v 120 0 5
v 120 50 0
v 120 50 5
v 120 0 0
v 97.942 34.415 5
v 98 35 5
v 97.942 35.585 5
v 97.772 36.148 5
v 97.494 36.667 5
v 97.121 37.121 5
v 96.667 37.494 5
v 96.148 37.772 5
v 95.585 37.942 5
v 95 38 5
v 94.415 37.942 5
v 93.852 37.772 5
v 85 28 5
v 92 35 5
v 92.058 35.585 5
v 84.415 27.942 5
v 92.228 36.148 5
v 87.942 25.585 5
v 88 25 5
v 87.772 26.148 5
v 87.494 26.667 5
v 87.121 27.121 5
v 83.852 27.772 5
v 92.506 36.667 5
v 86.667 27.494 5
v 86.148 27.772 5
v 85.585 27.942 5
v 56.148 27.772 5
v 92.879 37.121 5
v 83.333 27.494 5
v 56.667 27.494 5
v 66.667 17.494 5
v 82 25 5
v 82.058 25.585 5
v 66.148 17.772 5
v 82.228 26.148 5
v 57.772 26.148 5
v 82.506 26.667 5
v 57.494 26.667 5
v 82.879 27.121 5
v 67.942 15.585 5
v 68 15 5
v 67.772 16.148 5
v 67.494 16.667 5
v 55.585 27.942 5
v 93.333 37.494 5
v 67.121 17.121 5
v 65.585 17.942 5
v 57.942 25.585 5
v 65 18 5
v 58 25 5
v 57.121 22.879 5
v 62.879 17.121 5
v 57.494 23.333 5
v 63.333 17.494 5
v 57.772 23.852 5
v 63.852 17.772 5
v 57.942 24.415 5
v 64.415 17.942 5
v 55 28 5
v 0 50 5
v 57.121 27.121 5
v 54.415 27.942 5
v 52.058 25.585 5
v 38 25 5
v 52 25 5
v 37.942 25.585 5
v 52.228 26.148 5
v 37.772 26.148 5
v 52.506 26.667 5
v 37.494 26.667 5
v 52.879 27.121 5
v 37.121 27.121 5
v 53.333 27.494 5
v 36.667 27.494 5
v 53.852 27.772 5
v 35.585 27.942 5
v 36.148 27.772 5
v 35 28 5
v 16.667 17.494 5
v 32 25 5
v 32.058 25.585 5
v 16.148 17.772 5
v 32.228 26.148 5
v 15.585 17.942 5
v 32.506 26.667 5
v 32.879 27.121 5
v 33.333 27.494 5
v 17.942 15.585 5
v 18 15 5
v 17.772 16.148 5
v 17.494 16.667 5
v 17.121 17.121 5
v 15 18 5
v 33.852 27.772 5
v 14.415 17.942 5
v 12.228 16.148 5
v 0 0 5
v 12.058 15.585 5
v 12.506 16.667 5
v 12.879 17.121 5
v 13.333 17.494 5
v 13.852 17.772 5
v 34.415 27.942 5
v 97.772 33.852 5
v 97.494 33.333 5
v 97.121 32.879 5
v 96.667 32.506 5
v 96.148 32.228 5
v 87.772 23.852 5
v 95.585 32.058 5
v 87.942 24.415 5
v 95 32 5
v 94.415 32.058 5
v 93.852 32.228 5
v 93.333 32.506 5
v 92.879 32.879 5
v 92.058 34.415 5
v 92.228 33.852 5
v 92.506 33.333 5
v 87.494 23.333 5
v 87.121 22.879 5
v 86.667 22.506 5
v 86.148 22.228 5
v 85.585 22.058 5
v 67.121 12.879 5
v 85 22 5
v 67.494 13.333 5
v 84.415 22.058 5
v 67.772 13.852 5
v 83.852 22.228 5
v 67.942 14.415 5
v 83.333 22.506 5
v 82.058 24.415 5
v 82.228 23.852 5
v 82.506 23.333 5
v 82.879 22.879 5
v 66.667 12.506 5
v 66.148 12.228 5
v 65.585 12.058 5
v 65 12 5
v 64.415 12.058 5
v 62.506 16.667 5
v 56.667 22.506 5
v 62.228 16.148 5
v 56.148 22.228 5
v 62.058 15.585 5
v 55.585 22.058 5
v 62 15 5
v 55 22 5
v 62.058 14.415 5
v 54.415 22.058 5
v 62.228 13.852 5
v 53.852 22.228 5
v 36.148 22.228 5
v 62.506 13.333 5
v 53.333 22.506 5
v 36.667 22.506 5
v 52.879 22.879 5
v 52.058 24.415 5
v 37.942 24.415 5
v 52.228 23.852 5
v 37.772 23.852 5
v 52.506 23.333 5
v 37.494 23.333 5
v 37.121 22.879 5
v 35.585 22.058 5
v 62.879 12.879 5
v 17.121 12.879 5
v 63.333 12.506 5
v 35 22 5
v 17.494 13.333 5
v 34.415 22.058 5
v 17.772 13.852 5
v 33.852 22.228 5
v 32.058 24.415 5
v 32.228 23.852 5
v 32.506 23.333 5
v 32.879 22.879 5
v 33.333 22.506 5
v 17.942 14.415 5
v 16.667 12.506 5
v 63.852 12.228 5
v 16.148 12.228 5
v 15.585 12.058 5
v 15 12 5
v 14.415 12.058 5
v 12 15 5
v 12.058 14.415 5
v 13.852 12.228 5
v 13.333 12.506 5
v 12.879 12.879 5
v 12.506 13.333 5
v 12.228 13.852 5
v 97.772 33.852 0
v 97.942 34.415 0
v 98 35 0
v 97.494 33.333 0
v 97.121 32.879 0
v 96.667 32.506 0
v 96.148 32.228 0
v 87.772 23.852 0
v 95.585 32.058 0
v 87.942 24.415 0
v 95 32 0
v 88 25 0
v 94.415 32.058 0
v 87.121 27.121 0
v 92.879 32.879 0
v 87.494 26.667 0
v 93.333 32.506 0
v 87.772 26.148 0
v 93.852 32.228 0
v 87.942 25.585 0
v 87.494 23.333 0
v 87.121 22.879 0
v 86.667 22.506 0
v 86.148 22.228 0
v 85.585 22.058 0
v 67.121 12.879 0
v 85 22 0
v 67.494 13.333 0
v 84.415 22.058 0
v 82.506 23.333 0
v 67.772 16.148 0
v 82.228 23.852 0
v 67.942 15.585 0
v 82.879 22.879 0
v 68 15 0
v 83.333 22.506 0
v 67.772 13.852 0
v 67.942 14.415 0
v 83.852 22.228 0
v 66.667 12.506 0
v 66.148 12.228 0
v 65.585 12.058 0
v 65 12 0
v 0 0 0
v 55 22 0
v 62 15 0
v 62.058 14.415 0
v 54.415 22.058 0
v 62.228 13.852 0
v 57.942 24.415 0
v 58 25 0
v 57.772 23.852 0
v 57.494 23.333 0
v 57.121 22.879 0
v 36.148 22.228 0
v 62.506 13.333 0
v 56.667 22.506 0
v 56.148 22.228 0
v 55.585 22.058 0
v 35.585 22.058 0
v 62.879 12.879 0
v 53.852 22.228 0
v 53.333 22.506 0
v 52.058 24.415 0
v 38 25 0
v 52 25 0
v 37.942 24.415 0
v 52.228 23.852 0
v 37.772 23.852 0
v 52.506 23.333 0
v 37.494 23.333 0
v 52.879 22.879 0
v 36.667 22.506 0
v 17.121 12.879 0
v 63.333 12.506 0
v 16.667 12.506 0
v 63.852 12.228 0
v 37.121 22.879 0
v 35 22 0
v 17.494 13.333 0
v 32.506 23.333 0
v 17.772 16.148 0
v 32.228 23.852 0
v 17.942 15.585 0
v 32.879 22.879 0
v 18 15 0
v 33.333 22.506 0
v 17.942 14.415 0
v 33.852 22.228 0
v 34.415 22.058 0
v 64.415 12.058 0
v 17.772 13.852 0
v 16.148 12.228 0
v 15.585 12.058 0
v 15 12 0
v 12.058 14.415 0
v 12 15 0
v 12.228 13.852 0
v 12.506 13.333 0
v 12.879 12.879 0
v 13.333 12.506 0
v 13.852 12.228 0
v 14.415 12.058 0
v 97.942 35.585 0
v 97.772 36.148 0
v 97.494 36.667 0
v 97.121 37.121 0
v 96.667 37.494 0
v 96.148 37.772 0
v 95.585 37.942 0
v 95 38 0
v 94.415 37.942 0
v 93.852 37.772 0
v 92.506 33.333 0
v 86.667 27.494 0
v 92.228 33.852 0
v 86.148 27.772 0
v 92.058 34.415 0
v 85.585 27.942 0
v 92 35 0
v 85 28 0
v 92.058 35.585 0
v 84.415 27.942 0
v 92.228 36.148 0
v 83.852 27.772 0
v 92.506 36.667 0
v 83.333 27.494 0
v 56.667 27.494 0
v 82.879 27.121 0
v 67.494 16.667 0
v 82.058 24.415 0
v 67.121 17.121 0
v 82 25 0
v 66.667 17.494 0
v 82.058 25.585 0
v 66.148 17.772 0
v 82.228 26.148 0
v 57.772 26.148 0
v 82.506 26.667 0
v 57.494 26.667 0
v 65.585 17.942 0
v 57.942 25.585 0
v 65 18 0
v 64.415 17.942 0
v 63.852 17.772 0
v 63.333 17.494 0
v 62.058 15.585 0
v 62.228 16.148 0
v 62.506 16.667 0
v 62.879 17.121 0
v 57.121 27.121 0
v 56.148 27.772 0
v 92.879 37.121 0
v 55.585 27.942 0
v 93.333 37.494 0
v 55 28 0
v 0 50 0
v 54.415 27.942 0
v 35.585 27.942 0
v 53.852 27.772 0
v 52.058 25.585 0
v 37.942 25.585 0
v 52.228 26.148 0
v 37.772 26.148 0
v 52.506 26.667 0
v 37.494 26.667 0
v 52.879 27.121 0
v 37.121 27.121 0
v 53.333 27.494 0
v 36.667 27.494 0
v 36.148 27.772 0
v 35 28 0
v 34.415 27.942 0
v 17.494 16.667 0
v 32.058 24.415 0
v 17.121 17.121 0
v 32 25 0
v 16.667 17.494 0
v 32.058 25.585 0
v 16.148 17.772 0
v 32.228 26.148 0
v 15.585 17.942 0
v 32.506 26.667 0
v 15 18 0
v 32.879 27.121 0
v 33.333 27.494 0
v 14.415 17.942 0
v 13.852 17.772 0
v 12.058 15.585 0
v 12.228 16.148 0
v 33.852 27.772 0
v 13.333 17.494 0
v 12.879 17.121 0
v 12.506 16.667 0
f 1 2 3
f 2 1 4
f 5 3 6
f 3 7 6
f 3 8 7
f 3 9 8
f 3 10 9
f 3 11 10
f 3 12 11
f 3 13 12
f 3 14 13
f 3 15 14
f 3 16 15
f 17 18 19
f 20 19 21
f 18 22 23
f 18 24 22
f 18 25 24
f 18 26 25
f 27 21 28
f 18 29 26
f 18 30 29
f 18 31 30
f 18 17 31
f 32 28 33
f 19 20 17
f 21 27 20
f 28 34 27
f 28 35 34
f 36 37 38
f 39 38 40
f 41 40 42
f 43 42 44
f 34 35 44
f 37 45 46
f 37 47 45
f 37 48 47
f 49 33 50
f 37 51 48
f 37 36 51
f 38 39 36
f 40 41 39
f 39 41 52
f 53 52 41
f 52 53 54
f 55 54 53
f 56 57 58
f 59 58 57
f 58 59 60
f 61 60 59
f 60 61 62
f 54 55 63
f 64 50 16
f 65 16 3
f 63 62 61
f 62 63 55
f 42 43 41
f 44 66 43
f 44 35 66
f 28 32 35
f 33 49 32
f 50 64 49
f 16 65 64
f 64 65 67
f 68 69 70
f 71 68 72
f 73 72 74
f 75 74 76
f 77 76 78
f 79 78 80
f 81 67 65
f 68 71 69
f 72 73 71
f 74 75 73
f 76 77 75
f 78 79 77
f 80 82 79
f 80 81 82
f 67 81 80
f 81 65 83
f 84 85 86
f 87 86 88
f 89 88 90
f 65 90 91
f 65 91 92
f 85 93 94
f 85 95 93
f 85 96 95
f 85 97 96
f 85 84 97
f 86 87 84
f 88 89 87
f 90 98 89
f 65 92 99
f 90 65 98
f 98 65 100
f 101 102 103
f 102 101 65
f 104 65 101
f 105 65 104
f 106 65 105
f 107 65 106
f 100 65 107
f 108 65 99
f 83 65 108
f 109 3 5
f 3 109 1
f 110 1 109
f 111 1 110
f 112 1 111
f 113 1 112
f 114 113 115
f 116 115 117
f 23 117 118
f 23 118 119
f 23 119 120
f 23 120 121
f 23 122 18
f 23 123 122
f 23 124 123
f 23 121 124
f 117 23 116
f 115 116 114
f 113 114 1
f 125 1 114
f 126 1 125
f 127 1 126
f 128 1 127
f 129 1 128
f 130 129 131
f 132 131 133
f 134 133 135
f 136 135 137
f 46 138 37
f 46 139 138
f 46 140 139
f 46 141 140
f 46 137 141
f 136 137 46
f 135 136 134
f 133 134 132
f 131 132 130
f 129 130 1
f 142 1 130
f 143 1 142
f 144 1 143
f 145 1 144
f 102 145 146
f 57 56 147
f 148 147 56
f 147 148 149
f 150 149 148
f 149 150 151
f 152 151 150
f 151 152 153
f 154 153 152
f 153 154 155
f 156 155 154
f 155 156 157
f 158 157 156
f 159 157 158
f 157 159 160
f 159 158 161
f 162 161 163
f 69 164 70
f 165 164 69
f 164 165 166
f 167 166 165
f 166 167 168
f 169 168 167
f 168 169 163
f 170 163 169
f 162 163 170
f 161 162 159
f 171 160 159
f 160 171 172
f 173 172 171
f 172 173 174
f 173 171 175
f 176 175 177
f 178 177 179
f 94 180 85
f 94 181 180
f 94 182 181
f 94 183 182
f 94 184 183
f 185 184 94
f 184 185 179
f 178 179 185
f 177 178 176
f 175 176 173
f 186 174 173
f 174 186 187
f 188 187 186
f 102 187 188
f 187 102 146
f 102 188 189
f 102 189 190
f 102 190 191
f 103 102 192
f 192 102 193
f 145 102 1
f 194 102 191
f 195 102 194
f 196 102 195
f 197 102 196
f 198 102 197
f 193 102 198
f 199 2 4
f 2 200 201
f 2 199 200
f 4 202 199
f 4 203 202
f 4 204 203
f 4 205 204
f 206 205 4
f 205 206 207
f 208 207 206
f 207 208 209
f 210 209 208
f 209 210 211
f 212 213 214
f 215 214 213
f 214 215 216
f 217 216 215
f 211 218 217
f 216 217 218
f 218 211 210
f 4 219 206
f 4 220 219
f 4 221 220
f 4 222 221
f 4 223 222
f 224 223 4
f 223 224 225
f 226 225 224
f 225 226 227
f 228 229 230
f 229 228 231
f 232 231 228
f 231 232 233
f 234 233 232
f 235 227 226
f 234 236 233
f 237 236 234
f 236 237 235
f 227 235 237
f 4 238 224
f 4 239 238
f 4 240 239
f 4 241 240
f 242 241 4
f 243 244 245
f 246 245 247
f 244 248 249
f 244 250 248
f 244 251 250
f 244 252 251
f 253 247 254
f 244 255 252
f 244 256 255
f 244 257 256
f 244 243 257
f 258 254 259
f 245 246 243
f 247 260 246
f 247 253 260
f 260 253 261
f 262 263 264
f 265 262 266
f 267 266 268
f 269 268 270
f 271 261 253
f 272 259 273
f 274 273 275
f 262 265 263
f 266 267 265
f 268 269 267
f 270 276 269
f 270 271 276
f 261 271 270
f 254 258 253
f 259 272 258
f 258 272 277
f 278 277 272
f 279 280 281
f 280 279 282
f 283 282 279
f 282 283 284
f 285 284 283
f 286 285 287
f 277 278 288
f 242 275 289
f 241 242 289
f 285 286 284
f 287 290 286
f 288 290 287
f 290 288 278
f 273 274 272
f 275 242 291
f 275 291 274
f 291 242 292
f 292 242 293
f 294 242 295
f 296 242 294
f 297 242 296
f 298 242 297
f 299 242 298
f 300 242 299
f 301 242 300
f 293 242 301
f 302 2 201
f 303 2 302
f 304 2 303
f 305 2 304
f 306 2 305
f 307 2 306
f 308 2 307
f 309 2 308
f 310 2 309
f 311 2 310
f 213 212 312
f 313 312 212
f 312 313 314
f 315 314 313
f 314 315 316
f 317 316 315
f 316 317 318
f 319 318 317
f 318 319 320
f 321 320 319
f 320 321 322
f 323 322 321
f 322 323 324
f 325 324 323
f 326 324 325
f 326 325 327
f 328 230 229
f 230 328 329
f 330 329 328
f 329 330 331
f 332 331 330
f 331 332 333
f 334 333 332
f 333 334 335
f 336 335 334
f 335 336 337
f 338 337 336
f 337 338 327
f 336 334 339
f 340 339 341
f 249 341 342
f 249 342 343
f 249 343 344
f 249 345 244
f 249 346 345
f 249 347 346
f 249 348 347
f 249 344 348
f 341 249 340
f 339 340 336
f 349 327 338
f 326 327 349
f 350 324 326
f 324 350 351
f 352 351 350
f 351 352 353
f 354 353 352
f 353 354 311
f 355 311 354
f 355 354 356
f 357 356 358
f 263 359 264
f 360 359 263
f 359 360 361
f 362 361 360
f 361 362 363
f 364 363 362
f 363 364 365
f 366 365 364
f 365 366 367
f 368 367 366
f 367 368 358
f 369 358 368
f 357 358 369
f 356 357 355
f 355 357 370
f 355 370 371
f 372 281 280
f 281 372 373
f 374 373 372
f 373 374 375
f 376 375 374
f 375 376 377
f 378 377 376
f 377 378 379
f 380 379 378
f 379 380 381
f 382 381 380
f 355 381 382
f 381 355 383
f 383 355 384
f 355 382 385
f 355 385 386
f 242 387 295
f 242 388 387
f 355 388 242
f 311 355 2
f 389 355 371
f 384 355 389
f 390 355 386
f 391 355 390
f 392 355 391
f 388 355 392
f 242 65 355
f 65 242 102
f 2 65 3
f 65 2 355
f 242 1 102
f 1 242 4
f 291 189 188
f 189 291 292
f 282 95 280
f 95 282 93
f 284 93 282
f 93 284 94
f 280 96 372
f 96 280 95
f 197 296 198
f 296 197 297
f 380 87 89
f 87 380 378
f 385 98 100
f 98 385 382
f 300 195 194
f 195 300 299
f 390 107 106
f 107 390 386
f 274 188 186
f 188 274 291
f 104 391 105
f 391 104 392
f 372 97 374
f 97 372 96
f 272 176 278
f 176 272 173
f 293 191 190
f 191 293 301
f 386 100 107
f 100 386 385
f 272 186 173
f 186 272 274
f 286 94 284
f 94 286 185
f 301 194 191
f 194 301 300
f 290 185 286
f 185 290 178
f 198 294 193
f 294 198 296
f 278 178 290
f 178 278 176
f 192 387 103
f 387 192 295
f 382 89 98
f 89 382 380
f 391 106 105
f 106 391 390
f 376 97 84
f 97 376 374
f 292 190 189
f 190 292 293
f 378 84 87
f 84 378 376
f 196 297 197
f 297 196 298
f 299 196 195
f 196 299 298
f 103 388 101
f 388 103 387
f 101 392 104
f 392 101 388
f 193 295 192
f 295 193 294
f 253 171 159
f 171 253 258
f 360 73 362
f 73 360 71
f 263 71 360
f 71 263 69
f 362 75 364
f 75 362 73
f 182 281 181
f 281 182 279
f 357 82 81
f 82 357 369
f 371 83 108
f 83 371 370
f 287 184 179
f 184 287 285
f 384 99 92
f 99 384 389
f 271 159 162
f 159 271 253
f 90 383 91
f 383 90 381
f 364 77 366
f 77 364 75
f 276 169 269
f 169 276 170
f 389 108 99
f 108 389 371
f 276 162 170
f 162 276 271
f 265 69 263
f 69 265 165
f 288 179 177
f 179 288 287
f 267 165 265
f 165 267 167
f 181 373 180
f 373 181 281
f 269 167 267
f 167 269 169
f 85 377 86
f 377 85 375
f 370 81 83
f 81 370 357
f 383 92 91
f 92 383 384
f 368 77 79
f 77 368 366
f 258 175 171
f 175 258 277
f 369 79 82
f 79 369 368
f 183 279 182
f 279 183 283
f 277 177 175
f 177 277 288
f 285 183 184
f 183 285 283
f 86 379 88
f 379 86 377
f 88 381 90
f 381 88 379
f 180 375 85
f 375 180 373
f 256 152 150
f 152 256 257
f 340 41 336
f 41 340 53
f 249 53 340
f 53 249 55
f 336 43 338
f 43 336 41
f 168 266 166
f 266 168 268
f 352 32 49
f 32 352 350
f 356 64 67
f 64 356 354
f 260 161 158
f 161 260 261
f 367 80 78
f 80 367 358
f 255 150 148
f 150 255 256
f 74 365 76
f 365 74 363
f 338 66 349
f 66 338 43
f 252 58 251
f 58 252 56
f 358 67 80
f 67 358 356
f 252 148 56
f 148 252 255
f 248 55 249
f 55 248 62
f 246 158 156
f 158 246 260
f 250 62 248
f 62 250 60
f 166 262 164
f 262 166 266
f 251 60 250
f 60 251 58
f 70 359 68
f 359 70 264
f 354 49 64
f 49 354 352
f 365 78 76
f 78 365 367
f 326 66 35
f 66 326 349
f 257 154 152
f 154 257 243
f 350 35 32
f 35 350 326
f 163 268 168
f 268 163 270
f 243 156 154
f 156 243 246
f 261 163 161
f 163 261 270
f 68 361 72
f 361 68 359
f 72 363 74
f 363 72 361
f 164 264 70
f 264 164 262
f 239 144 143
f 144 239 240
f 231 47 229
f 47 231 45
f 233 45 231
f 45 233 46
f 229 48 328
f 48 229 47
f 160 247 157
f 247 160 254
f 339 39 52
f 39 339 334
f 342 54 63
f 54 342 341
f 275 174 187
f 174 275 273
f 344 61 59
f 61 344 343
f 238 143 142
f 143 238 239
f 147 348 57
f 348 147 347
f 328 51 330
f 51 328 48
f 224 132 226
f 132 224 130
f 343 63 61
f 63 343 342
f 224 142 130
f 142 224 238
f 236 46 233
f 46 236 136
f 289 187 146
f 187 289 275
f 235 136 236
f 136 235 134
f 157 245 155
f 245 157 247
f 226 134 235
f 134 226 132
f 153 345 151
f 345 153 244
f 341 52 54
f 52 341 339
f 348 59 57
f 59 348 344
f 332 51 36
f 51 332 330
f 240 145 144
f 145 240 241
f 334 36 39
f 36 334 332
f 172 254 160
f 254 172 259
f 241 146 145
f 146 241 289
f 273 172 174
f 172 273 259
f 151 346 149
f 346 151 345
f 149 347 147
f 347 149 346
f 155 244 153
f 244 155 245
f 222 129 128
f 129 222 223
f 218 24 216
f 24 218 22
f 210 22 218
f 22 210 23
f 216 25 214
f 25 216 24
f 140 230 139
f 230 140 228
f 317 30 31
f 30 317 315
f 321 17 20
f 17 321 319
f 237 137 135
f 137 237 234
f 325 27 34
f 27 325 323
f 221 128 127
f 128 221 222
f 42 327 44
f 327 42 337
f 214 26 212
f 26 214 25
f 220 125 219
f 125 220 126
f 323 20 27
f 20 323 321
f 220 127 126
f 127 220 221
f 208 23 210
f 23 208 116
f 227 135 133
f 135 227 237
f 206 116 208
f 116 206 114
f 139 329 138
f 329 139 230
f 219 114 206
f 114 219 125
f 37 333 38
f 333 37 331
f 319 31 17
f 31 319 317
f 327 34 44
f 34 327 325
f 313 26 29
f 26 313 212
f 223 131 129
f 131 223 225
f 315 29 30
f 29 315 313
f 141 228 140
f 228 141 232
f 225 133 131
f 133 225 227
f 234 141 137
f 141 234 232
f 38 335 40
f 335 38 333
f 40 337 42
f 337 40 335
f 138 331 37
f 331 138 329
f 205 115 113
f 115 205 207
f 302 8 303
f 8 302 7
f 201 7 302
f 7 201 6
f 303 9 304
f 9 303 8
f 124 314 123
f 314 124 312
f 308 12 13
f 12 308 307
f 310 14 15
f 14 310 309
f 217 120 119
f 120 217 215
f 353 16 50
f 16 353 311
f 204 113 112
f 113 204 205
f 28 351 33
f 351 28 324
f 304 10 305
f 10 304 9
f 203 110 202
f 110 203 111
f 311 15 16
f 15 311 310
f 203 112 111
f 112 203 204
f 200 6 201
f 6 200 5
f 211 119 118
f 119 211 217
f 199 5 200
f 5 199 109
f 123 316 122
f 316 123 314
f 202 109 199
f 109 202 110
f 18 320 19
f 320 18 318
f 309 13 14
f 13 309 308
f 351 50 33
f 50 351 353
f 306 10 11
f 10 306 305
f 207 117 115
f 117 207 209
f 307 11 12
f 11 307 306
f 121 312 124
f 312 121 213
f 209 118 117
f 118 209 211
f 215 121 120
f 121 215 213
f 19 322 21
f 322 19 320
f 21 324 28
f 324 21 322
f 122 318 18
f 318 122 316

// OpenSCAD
$fn = 32;

// ----------------------------------------------------------------------
// Hole field: plate with holes at given coordinates
// ----------------------------------------------------------------------

// --- parameters (mm) ---
plate_l = 120;            // plate length, X
plate_w = 50;             // plate width, Y
plate_t = 5;              // plate thickness, Z
hole_d = 6;               // hole diameter

difference() {
  cube([plate_l, plate_w, plate_t]);
  translate([15, 15, -1]) cylinder(h = plate_t + 2, d = hole_d);
  translate([35, 25, -1]) cylinder(h = plate_t + 2, d = hole_d);
  translate([55, 25, -1]) cylinder(h = plate_t + 2, d = hole_d);
  translate([65, 15, -1]) cylinder(h = plate_t + 2, d = hole_d);
  translate([85, 25, -1]) cylinder(h = plate_t + 2, d = hole_d);
  translate([95, 35, -1]) cylinder(h = plate_t + 2, d = hole_d);
}
